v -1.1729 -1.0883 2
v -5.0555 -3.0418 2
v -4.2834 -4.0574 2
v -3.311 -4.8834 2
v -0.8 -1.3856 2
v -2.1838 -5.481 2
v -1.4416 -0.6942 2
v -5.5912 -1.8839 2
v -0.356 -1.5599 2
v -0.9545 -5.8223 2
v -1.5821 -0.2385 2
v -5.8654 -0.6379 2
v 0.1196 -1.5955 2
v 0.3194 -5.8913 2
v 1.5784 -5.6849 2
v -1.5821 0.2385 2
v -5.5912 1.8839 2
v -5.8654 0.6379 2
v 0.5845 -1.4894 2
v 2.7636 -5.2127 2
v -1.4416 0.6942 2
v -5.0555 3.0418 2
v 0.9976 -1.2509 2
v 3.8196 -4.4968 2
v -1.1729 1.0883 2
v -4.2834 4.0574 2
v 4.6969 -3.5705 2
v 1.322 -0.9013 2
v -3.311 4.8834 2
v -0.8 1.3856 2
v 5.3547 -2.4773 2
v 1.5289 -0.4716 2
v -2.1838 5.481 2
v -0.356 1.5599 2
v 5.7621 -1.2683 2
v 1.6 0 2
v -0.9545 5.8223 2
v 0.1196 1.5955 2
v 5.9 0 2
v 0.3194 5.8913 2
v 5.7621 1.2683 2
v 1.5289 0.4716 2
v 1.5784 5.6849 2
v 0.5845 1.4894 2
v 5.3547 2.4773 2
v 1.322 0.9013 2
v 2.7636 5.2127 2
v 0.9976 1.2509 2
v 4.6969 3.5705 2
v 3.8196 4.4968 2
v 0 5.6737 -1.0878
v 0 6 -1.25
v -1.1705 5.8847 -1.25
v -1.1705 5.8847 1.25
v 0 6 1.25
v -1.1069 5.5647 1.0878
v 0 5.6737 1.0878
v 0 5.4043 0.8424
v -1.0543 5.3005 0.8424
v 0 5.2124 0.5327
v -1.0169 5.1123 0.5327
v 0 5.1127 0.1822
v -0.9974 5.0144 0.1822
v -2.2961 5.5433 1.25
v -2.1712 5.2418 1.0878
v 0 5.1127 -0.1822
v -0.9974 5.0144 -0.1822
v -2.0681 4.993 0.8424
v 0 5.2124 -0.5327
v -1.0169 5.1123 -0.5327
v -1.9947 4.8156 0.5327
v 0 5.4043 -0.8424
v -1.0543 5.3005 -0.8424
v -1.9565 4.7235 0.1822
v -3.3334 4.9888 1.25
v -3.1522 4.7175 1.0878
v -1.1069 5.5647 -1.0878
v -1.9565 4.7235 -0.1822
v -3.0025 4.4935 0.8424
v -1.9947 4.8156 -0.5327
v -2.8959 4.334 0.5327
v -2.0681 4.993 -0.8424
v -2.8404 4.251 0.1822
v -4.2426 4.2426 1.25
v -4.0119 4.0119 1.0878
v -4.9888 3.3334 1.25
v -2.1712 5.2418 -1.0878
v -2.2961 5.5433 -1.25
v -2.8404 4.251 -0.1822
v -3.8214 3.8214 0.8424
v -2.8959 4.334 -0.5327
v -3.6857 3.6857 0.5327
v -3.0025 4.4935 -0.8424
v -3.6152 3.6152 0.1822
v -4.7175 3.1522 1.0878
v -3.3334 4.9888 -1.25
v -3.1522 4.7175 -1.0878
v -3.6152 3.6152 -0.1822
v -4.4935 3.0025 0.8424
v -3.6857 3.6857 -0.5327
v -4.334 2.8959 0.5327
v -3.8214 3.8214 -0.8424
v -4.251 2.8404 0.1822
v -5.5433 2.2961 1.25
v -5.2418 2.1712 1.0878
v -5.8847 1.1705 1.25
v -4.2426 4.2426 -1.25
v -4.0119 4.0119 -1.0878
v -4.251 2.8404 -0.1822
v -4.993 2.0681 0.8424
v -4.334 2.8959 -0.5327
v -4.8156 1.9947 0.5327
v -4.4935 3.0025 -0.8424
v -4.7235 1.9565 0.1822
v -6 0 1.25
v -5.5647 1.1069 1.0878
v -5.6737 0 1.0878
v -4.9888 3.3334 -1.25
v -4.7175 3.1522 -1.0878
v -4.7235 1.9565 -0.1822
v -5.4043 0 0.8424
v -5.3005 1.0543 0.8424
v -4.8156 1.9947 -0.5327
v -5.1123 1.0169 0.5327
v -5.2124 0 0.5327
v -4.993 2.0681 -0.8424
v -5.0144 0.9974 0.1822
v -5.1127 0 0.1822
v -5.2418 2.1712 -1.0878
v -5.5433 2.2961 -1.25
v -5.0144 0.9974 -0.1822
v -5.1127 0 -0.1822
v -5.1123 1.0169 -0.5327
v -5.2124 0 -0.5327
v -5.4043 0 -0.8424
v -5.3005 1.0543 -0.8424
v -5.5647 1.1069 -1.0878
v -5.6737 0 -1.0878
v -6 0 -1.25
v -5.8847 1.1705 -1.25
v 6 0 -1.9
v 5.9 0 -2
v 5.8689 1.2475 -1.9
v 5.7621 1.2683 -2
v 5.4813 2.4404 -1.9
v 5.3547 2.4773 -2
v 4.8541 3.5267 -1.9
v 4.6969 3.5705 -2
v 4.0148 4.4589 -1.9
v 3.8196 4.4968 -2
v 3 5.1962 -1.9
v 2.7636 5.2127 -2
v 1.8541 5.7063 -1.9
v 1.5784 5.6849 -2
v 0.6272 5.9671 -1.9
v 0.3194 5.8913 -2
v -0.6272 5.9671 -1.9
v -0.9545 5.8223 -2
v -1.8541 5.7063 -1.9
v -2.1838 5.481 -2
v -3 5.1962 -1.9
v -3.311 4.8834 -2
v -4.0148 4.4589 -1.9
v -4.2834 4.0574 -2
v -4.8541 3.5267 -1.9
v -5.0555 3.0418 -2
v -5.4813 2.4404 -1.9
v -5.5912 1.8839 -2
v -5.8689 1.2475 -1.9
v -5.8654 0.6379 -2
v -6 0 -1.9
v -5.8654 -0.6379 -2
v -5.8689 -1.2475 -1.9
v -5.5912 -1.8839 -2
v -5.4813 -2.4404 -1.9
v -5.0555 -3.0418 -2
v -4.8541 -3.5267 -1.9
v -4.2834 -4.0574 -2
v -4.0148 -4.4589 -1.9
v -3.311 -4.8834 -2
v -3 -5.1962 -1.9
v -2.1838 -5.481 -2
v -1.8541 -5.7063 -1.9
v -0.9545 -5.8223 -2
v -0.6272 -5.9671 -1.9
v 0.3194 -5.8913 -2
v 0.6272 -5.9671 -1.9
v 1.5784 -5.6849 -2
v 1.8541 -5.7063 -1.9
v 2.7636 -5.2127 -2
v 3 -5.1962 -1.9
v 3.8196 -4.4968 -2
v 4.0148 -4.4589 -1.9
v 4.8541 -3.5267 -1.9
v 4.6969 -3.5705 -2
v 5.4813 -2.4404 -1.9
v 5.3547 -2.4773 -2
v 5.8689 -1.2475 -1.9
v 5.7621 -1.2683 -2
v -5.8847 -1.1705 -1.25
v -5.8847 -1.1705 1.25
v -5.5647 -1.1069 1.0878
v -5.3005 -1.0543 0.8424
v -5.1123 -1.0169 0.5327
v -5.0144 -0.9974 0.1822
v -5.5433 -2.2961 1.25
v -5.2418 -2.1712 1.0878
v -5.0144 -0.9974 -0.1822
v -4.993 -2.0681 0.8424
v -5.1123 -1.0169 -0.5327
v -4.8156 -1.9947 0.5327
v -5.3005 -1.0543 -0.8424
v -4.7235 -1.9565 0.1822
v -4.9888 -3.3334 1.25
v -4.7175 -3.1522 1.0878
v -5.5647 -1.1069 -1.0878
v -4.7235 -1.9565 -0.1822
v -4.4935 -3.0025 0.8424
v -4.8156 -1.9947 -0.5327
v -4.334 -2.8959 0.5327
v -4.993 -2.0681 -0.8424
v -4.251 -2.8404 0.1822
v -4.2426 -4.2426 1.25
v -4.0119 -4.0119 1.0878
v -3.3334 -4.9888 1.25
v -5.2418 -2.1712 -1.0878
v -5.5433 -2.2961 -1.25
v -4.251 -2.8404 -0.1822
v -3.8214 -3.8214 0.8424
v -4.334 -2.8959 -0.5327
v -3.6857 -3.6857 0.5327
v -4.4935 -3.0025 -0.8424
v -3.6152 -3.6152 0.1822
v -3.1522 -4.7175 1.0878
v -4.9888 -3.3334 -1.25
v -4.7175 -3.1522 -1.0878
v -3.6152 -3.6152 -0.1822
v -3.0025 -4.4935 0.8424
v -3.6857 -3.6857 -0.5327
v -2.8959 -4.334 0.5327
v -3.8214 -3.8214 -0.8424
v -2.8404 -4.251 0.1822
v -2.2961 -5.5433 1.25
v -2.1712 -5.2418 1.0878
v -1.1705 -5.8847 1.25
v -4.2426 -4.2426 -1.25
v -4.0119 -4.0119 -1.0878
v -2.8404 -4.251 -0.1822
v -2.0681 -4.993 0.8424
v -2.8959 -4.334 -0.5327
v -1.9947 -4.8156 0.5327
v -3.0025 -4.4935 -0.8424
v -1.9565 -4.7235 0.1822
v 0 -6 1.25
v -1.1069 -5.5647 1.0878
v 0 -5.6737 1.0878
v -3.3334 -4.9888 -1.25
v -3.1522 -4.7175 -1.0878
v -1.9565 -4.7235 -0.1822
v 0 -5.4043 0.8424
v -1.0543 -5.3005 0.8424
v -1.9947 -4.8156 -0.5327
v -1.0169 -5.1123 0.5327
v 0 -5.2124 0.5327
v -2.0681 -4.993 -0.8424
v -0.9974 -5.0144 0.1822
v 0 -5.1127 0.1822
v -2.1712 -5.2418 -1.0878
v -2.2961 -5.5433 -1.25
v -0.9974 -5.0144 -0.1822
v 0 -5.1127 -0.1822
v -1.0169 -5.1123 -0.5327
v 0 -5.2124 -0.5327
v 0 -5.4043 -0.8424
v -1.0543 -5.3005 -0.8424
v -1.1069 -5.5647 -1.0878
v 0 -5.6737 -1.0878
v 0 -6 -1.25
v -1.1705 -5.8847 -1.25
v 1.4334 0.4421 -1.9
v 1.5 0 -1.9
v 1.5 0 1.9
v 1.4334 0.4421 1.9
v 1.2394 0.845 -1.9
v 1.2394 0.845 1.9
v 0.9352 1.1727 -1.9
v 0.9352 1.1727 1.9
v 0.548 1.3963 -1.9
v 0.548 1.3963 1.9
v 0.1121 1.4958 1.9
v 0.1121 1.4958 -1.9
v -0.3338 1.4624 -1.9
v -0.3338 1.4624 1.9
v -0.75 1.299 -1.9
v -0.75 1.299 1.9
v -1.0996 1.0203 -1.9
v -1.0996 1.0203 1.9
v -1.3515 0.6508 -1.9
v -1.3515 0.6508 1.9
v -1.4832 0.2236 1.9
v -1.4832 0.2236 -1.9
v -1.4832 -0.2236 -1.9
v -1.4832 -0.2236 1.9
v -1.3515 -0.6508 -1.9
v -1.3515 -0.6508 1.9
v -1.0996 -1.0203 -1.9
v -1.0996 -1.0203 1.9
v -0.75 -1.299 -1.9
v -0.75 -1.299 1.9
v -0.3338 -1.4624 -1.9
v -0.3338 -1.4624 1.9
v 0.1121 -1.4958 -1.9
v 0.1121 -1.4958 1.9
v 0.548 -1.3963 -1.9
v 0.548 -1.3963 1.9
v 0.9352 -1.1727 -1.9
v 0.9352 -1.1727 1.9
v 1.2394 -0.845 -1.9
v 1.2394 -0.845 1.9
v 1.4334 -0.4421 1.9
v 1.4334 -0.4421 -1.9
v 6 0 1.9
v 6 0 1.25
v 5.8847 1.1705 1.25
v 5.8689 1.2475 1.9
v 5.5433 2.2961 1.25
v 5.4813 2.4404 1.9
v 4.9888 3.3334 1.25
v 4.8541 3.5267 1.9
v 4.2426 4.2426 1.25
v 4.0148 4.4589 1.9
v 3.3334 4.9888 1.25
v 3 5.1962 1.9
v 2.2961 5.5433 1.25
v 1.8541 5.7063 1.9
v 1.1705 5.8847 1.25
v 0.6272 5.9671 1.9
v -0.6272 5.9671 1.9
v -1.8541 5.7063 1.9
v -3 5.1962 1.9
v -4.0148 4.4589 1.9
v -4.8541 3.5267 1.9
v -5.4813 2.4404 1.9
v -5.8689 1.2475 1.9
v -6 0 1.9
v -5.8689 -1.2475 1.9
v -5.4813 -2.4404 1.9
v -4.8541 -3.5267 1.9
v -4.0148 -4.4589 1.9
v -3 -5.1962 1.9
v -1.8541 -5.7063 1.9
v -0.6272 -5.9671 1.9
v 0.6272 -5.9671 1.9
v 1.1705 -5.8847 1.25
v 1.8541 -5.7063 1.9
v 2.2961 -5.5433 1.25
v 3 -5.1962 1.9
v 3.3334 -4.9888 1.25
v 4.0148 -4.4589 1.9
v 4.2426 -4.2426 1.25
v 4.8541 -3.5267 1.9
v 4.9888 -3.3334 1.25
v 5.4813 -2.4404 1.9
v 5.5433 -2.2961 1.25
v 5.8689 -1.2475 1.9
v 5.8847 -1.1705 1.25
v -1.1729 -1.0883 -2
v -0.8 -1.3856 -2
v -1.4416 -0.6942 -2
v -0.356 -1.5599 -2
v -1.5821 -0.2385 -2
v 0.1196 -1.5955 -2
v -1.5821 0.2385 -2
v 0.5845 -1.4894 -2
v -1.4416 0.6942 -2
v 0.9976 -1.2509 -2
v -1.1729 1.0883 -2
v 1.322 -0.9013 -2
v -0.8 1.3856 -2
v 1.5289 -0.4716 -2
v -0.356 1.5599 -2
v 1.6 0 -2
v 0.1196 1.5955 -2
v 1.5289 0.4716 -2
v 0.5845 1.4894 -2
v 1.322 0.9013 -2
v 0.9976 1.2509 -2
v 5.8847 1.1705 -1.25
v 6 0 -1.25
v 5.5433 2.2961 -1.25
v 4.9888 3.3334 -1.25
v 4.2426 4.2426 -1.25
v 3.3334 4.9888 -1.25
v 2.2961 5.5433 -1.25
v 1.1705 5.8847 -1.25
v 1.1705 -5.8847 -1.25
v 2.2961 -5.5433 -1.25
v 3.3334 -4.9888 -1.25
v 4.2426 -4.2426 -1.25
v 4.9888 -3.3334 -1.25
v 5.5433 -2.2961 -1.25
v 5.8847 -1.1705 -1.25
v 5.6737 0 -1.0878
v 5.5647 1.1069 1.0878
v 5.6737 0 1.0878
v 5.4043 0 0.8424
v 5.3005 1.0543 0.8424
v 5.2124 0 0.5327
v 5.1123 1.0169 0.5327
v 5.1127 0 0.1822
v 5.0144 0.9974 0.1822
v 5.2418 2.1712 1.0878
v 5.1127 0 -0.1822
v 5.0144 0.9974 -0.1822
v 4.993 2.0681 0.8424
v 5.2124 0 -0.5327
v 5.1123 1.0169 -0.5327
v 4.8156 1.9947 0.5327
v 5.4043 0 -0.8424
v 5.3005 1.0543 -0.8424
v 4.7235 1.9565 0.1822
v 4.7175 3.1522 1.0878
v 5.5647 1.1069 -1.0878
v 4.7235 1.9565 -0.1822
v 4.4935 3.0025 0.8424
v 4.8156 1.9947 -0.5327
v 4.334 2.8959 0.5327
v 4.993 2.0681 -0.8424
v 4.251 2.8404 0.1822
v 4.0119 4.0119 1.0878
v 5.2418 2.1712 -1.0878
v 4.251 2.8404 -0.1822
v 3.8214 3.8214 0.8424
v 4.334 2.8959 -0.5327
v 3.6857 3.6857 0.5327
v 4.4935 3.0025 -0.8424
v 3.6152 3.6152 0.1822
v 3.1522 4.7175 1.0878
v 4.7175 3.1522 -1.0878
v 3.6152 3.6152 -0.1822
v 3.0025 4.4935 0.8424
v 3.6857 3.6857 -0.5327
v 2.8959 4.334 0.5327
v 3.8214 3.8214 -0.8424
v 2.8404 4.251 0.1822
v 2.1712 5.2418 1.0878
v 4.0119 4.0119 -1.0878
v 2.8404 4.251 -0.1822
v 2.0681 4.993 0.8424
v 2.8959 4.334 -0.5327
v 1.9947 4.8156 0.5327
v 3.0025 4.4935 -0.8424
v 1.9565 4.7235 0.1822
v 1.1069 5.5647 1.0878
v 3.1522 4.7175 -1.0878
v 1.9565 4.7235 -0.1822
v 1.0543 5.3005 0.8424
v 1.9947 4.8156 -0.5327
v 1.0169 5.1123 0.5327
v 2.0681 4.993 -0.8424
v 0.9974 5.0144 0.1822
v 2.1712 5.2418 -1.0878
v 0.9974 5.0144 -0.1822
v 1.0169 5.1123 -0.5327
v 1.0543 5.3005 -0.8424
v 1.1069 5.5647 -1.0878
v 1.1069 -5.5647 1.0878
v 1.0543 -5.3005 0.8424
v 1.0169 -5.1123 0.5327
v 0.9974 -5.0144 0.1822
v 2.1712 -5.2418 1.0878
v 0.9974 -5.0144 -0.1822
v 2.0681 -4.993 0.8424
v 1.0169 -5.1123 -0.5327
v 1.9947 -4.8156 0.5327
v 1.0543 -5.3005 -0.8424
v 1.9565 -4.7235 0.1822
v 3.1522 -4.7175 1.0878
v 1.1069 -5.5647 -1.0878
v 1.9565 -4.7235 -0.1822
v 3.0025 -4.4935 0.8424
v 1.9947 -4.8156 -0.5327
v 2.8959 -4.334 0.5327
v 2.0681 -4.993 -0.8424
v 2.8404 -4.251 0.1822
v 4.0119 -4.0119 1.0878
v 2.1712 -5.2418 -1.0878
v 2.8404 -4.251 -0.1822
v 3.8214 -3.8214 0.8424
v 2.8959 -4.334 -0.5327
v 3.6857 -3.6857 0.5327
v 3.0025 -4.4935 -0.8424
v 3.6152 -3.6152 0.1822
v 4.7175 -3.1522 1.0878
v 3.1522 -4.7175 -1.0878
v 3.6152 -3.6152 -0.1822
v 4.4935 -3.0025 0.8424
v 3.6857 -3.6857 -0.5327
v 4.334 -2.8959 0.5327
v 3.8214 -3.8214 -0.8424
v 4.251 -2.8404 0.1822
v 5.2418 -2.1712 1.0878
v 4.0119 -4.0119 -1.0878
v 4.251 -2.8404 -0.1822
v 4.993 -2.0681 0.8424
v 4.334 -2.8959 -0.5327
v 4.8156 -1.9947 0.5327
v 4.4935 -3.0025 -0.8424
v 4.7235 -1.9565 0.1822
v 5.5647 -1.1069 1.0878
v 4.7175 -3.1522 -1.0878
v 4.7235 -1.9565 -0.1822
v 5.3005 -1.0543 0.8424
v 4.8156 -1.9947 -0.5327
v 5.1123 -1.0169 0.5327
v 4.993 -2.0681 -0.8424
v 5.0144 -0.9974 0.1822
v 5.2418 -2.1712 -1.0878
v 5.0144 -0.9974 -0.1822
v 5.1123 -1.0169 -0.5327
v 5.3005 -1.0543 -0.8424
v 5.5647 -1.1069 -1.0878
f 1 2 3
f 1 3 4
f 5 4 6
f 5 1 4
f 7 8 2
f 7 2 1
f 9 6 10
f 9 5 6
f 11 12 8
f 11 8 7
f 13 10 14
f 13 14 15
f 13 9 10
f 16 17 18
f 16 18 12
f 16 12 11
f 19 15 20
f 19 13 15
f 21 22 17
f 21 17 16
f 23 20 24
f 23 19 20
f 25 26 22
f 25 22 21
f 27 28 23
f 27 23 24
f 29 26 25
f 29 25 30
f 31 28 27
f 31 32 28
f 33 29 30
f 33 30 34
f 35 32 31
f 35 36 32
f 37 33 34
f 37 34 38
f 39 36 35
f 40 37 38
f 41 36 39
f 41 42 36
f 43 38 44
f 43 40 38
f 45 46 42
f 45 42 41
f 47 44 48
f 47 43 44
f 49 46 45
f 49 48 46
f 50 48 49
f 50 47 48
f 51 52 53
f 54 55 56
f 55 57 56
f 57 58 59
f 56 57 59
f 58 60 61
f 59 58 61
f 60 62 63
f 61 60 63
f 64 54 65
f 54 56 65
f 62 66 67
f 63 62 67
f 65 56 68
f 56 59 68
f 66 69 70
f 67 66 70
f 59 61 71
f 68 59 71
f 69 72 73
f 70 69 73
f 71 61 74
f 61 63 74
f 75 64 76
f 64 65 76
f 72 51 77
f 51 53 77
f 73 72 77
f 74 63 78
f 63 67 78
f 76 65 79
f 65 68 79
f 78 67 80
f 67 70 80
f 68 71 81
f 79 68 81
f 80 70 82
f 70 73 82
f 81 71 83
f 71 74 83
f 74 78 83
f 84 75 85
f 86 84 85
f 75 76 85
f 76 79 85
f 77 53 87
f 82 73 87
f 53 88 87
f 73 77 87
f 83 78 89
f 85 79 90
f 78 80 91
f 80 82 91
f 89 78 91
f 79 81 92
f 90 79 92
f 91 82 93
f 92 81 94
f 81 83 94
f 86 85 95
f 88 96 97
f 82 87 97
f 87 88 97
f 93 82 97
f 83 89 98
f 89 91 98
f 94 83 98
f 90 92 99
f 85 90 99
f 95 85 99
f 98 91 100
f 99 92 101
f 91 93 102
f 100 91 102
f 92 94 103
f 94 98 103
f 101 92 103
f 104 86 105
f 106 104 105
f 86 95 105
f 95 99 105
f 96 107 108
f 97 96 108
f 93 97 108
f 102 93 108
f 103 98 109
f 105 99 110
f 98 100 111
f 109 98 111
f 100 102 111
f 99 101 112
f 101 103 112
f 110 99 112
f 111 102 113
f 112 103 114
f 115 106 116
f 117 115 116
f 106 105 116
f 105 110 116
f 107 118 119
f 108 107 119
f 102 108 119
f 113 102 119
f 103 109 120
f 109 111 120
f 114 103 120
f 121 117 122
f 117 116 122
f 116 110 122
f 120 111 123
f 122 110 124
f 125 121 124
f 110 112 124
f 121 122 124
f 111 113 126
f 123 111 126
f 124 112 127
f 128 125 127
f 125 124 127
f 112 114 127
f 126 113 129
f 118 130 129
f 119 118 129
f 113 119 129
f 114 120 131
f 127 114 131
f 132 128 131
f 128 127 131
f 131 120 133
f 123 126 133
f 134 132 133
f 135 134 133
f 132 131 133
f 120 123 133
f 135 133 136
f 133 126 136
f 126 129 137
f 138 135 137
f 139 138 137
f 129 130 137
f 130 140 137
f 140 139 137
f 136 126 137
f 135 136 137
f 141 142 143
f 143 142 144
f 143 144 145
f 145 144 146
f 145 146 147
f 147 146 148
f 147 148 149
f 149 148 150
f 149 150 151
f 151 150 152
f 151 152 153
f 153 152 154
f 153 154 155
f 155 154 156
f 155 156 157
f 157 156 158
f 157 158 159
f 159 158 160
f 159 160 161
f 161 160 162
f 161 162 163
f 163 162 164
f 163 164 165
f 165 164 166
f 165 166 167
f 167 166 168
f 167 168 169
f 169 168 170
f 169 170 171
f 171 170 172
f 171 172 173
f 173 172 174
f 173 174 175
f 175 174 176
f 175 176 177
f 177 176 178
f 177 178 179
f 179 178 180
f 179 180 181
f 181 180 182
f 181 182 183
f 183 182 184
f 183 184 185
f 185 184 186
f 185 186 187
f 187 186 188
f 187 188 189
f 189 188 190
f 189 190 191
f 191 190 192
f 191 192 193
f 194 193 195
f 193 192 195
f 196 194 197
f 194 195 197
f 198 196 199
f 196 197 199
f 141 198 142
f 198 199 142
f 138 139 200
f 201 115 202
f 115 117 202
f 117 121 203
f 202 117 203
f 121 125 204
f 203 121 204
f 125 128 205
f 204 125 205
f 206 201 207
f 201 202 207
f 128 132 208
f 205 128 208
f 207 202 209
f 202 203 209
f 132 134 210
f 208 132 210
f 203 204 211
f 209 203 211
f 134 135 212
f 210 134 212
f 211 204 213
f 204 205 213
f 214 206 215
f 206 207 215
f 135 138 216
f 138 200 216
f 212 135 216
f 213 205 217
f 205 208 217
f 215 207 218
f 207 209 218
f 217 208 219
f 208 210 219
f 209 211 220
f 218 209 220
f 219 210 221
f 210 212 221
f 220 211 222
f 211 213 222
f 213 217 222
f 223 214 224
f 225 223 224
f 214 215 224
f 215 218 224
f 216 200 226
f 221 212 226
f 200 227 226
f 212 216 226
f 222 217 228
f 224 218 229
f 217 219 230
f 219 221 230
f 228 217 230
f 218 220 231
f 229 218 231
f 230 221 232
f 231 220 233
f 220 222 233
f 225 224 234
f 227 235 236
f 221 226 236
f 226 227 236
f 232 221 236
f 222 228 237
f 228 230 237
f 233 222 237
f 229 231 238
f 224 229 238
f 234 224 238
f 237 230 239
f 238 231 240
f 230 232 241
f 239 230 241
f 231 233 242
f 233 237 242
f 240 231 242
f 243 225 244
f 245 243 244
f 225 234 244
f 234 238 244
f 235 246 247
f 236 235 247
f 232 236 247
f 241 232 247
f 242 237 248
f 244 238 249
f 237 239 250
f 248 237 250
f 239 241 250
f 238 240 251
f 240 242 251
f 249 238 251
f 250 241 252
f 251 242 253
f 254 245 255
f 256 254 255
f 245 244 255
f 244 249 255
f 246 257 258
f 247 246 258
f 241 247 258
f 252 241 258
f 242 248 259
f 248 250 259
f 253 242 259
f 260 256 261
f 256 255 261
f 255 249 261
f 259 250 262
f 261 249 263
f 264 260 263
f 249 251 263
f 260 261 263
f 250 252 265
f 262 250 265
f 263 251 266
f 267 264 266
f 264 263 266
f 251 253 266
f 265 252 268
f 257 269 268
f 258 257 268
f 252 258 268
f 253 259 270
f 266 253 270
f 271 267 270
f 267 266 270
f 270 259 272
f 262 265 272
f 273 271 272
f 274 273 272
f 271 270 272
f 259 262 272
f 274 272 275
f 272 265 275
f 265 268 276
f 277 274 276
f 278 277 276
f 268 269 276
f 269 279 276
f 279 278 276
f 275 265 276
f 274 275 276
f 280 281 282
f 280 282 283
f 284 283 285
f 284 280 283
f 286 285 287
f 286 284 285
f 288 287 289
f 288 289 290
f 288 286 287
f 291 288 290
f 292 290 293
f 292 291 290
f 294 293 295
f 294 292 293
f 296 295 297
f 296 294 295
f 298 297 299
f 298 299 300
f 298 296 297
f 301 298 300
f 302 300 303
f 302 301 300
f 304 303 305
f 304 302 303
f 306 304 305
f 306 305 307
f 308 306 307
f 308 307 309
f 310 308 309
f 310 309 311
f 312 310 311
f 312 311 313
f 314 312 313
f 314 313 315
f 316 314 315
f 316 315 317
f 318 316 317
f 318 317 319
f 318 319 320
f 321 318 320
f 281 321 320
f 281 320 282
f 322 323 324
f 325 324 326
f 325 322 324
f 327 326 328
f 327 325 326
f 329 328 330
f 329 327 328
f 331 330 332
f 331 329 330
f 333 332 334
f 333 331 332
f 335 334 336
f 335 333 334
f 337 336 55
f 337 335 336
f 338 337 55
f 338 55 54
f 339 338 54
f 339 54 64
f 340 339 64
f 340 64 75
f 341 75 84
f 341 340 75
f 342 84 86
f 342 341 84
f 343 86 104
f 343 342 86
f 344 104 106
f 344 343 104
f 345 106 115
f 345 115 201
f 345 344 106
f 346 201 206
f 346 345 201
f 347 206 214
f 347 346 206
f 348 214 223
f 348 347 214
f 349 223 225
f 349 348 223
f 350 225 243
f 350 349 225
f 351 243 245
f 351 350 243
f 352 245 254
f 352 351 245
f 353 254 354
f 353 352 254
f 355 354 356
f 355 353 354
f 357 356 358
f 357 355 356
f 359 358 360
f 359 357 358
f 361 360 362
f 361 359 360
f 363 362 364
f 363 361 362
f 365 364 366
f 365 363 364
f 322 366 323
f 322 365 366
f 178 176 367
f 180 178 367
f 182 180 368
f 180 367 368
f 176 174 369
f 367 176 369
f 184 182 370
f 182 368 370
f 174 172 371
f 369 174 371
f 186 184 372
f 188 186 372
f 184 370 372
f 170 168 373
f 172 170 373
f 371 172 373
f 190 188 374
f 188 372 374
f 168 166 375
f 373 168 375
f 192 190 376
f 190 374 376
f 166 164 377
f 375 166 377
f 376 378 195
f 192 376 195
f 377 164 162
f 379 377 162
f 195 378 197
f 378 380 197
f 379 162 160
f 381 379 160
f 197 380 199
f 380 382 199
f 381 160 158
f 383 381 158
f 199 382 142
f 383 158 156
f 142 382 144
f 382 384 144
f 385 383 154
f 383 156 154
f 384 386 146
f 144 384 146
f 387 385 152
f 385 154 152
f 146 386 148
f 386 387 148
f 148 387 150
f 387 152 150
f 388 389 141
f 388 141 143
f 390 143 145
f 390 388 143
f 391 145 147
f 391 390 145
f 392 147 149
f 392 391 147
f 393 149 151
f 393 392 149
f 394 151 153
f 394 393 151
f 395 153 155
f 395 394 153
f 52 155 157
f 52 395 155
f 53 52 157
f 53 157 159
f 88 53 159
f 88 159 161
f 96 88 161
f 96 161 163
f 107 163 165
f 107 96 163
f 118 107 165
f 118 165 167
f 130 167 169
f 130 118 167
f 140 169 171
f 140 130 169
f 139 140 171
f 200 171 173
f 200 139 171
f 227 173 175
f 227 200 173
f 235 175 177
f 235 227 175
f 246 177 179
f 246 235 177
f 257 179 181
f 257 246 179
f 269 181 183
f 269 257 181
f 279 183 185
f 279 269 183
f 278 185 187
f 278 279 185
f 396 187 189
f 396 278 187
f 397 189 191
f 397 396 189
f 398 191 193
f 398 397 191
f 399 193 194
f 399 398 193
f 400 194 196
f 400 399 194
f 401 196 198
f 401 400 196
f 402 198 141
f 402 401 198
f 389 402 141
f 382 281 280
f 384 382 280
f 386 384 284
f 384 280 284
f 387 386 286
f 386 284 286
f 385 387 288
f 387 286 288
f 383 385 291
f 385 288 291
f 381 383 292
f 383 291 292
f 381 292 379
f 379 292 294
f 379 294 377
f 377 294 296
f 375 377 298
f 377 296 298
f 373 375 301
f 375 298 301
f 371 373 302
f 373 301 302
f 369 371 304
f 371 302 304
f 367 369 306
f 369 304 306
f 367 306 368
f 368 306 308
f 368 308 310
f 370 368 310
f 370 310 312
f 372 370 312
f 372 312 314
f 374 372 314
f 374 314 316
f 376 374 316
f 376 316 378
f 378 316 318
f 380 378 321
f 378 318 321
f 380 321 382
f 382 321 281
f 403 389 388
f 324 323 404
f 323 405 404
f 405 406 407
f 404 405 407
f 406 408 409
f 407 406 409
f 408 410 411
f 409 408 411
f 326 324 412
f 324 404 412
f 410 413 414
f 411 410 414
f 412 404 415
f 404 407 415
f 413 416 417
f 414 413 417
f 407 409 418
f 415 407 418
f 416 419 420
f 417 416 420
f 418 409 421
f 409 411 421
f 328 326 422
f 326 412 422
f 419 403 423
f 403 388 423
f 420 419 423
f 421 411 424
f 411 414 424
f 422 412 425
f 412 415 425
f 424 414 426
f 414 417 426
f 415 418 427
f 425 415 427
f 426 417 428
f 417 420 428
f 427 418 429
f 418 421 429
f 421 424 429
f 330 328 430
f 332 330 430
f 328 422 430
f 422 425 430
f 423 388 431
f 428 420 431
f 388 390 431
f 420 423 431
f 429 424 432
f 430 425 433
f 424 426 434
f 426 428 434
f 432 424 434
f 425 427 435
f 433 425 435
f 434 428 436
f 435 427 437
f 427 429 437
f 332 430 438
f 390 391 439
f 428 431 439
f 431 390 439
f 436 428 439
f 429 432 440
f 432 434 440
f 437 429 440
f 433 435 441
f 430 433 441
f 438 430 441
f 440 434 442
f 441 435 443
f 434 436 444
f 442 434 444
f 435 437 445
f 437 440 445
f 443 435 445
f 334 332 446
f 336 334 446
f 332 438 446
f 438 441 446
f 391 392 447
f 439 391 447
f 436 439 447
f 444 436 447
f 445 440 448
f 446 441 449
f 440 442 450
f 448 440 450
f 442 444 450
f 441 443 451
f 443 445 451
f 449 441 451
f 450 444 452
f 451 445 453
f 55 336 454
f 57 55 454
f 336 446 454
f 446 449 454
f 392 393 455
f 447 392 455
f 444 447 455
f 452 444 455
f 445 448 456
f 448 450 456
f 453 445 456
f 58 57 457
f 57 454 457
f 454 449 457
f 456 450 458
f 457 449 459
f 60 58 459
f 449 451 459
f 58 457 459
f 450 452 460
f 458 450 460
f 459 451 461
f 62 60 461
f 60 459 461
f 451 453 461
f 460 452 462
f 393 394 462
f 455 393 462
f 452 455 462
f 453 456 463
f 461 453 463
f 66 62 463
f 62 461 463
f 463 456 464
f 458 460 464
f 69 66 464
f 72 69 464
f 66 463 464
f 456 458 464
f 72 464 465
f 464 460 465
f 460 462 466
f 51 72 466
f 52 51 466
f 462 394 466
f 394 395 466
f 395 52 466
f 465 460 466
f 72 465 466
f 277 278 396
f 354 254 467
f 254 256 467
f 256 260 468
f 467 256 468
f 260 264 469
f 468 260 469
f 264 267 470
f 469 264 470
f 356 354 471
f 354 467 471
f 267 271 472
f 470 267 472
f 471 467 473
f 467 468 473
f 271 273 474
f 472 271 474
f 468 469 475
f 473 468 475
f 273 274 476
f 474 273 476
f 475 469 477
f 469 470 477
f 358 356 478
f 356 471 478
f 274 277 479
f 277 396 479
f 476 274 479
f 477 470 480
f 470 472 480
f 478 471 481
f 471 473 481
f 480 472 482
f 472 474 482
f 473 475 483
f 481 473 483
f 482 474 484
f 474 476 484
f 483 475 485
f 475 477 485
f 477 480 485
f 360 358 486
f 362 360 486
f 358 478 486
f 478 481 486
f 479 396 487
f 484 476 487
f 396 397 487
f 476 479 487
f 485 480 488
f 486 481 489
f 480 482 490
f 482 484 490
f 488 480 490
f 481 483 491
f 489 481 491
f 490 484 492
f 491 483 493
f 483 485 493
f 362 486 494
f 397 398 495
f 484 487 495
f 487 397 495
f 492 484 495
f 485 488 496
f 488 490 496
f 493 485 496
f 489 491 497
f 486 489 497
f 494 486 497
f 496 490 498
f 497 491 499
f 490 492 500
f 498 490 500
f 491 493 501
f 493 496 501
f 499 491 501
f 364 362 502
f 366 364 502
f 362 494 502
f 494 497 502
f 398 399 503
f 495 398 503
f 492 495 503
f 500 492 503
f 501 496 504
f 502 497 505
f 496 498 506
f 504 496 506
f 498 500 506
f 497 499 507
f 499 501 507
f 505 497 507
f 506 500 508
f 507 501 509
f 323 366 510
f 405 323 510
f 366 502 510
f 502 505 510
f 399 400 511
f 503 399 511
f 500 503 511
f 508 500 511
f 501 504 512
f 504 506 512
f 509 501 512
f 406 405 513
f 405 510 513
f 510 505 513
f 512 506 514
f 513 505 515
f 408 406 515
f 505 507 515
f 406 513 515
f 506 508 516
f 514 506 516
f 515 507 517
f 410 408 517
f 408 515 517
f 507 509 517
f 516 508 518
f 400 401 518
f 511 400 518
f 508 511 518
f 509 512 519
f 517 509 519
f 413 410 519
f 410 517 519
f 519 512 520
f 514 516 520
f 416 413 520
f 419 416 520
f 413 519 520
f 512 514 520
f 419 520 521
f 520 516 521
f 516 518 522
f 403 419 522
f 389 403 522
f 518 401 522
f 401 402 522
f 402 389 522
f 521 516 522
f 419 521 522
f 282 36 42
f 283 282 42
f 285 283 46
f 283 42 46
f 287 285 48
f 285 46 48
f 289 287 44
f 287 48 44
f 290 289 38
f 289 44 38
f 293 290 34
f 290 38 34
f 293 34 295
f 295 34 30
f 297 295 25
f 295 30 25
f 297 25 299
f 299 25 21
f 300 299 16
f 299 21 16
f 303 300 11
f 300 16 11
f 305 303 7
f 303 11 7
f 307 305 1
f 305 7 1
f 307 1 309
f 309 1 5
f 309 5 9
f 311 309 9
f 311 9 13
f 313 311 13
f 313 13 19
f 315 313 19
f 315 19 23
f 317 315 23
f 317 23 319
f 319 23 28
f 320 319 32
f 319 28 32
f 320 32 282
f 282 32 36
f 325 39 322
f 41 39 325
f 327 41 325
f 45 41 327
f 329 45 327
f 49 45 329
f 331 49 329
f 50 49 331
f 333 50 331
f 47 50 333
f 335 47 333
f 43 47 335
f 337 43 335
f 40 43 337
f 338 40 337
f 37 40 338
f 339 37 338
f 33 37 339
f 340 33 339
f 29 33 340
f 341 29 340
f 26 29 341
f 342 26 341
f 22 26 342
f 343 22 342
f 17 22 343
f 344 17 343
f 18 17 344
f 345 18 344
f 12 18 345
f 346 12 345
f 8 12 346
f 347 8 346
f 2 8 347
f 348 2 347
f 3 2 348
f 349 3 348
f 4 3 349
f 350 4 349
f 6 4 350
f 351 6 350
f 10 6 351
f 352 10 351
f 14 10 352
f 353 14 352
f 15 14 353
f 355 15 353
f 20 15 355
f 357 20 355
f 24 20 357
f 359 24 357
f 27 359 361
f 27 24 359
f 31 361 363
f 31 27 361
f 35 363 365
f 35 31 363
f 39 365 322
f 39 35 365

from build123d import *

# Parameters (mm, degrees)
SKETCH_1_R      = 6
SKETCH_1_R_2    = 1.5
EXTRUDE_1_DEPTH = 2
CHAMFER_1_SIZE  = 0.1


with BuildPart() as part:
    # 草图1 → 凸台-拉伸1 (new, symmetric)
    with BuildSketch(Plane.XY):
        Circle(SKETCH_1_R)
        Circle(SKETCH_1_R_2, mode=Mode.SUBTRACT)
    extrude(amount=EXTRUDE_1_DEPTH, both=True)

    # 切除-扫描1: sweep along a curve in space
    with BuildLine() as sweep_1_path:
        ThreePointArc((6, 0, -2), (4.242640687, 4.242640687, -2), (0, 6, -2))
        ThreePointArc((0, 6, -2), (-4.242640687, 4.242640687, -2), (-6, 0, -2))
        ThreePointArc((-6, 0, -2), (-4.242640687, -4.242640687, -2), (0, -6, -2))
        ThreePointArc((0, -6, -2), (4.242640687, -4.242640687, -2), (6, 0, -2))
    # 草图2 → 切除-扫描1 (sweep, cut)
    with BuildSketch(Plane(origin=(0, 0, 0), x_dir=(0, 0, -1), z_dir=(1, 0, 0))):
        with BuildLine():
            Line((-1.25, 6), (1.25, 6))
            ThreePointArc((1.25, 6), (0, 5.1), (-1.25, 6))
        make_face()
    sweep(path=sweep_1_path.line, mode=Mode.SUBTRACT)

    # 倒角1
    chamfer_1_edges = [part.edges().sort_by_distance(p)[0] for p in [
        (-6, 0, -2),
        (-6, 0, 2),
        (-1.5, 0, -2),
        (-1.5, 0, 2),
    ]]
    chamfer(chamfer_1_edges, length=CHAMFER_1_SIZE)


solid = part.part
